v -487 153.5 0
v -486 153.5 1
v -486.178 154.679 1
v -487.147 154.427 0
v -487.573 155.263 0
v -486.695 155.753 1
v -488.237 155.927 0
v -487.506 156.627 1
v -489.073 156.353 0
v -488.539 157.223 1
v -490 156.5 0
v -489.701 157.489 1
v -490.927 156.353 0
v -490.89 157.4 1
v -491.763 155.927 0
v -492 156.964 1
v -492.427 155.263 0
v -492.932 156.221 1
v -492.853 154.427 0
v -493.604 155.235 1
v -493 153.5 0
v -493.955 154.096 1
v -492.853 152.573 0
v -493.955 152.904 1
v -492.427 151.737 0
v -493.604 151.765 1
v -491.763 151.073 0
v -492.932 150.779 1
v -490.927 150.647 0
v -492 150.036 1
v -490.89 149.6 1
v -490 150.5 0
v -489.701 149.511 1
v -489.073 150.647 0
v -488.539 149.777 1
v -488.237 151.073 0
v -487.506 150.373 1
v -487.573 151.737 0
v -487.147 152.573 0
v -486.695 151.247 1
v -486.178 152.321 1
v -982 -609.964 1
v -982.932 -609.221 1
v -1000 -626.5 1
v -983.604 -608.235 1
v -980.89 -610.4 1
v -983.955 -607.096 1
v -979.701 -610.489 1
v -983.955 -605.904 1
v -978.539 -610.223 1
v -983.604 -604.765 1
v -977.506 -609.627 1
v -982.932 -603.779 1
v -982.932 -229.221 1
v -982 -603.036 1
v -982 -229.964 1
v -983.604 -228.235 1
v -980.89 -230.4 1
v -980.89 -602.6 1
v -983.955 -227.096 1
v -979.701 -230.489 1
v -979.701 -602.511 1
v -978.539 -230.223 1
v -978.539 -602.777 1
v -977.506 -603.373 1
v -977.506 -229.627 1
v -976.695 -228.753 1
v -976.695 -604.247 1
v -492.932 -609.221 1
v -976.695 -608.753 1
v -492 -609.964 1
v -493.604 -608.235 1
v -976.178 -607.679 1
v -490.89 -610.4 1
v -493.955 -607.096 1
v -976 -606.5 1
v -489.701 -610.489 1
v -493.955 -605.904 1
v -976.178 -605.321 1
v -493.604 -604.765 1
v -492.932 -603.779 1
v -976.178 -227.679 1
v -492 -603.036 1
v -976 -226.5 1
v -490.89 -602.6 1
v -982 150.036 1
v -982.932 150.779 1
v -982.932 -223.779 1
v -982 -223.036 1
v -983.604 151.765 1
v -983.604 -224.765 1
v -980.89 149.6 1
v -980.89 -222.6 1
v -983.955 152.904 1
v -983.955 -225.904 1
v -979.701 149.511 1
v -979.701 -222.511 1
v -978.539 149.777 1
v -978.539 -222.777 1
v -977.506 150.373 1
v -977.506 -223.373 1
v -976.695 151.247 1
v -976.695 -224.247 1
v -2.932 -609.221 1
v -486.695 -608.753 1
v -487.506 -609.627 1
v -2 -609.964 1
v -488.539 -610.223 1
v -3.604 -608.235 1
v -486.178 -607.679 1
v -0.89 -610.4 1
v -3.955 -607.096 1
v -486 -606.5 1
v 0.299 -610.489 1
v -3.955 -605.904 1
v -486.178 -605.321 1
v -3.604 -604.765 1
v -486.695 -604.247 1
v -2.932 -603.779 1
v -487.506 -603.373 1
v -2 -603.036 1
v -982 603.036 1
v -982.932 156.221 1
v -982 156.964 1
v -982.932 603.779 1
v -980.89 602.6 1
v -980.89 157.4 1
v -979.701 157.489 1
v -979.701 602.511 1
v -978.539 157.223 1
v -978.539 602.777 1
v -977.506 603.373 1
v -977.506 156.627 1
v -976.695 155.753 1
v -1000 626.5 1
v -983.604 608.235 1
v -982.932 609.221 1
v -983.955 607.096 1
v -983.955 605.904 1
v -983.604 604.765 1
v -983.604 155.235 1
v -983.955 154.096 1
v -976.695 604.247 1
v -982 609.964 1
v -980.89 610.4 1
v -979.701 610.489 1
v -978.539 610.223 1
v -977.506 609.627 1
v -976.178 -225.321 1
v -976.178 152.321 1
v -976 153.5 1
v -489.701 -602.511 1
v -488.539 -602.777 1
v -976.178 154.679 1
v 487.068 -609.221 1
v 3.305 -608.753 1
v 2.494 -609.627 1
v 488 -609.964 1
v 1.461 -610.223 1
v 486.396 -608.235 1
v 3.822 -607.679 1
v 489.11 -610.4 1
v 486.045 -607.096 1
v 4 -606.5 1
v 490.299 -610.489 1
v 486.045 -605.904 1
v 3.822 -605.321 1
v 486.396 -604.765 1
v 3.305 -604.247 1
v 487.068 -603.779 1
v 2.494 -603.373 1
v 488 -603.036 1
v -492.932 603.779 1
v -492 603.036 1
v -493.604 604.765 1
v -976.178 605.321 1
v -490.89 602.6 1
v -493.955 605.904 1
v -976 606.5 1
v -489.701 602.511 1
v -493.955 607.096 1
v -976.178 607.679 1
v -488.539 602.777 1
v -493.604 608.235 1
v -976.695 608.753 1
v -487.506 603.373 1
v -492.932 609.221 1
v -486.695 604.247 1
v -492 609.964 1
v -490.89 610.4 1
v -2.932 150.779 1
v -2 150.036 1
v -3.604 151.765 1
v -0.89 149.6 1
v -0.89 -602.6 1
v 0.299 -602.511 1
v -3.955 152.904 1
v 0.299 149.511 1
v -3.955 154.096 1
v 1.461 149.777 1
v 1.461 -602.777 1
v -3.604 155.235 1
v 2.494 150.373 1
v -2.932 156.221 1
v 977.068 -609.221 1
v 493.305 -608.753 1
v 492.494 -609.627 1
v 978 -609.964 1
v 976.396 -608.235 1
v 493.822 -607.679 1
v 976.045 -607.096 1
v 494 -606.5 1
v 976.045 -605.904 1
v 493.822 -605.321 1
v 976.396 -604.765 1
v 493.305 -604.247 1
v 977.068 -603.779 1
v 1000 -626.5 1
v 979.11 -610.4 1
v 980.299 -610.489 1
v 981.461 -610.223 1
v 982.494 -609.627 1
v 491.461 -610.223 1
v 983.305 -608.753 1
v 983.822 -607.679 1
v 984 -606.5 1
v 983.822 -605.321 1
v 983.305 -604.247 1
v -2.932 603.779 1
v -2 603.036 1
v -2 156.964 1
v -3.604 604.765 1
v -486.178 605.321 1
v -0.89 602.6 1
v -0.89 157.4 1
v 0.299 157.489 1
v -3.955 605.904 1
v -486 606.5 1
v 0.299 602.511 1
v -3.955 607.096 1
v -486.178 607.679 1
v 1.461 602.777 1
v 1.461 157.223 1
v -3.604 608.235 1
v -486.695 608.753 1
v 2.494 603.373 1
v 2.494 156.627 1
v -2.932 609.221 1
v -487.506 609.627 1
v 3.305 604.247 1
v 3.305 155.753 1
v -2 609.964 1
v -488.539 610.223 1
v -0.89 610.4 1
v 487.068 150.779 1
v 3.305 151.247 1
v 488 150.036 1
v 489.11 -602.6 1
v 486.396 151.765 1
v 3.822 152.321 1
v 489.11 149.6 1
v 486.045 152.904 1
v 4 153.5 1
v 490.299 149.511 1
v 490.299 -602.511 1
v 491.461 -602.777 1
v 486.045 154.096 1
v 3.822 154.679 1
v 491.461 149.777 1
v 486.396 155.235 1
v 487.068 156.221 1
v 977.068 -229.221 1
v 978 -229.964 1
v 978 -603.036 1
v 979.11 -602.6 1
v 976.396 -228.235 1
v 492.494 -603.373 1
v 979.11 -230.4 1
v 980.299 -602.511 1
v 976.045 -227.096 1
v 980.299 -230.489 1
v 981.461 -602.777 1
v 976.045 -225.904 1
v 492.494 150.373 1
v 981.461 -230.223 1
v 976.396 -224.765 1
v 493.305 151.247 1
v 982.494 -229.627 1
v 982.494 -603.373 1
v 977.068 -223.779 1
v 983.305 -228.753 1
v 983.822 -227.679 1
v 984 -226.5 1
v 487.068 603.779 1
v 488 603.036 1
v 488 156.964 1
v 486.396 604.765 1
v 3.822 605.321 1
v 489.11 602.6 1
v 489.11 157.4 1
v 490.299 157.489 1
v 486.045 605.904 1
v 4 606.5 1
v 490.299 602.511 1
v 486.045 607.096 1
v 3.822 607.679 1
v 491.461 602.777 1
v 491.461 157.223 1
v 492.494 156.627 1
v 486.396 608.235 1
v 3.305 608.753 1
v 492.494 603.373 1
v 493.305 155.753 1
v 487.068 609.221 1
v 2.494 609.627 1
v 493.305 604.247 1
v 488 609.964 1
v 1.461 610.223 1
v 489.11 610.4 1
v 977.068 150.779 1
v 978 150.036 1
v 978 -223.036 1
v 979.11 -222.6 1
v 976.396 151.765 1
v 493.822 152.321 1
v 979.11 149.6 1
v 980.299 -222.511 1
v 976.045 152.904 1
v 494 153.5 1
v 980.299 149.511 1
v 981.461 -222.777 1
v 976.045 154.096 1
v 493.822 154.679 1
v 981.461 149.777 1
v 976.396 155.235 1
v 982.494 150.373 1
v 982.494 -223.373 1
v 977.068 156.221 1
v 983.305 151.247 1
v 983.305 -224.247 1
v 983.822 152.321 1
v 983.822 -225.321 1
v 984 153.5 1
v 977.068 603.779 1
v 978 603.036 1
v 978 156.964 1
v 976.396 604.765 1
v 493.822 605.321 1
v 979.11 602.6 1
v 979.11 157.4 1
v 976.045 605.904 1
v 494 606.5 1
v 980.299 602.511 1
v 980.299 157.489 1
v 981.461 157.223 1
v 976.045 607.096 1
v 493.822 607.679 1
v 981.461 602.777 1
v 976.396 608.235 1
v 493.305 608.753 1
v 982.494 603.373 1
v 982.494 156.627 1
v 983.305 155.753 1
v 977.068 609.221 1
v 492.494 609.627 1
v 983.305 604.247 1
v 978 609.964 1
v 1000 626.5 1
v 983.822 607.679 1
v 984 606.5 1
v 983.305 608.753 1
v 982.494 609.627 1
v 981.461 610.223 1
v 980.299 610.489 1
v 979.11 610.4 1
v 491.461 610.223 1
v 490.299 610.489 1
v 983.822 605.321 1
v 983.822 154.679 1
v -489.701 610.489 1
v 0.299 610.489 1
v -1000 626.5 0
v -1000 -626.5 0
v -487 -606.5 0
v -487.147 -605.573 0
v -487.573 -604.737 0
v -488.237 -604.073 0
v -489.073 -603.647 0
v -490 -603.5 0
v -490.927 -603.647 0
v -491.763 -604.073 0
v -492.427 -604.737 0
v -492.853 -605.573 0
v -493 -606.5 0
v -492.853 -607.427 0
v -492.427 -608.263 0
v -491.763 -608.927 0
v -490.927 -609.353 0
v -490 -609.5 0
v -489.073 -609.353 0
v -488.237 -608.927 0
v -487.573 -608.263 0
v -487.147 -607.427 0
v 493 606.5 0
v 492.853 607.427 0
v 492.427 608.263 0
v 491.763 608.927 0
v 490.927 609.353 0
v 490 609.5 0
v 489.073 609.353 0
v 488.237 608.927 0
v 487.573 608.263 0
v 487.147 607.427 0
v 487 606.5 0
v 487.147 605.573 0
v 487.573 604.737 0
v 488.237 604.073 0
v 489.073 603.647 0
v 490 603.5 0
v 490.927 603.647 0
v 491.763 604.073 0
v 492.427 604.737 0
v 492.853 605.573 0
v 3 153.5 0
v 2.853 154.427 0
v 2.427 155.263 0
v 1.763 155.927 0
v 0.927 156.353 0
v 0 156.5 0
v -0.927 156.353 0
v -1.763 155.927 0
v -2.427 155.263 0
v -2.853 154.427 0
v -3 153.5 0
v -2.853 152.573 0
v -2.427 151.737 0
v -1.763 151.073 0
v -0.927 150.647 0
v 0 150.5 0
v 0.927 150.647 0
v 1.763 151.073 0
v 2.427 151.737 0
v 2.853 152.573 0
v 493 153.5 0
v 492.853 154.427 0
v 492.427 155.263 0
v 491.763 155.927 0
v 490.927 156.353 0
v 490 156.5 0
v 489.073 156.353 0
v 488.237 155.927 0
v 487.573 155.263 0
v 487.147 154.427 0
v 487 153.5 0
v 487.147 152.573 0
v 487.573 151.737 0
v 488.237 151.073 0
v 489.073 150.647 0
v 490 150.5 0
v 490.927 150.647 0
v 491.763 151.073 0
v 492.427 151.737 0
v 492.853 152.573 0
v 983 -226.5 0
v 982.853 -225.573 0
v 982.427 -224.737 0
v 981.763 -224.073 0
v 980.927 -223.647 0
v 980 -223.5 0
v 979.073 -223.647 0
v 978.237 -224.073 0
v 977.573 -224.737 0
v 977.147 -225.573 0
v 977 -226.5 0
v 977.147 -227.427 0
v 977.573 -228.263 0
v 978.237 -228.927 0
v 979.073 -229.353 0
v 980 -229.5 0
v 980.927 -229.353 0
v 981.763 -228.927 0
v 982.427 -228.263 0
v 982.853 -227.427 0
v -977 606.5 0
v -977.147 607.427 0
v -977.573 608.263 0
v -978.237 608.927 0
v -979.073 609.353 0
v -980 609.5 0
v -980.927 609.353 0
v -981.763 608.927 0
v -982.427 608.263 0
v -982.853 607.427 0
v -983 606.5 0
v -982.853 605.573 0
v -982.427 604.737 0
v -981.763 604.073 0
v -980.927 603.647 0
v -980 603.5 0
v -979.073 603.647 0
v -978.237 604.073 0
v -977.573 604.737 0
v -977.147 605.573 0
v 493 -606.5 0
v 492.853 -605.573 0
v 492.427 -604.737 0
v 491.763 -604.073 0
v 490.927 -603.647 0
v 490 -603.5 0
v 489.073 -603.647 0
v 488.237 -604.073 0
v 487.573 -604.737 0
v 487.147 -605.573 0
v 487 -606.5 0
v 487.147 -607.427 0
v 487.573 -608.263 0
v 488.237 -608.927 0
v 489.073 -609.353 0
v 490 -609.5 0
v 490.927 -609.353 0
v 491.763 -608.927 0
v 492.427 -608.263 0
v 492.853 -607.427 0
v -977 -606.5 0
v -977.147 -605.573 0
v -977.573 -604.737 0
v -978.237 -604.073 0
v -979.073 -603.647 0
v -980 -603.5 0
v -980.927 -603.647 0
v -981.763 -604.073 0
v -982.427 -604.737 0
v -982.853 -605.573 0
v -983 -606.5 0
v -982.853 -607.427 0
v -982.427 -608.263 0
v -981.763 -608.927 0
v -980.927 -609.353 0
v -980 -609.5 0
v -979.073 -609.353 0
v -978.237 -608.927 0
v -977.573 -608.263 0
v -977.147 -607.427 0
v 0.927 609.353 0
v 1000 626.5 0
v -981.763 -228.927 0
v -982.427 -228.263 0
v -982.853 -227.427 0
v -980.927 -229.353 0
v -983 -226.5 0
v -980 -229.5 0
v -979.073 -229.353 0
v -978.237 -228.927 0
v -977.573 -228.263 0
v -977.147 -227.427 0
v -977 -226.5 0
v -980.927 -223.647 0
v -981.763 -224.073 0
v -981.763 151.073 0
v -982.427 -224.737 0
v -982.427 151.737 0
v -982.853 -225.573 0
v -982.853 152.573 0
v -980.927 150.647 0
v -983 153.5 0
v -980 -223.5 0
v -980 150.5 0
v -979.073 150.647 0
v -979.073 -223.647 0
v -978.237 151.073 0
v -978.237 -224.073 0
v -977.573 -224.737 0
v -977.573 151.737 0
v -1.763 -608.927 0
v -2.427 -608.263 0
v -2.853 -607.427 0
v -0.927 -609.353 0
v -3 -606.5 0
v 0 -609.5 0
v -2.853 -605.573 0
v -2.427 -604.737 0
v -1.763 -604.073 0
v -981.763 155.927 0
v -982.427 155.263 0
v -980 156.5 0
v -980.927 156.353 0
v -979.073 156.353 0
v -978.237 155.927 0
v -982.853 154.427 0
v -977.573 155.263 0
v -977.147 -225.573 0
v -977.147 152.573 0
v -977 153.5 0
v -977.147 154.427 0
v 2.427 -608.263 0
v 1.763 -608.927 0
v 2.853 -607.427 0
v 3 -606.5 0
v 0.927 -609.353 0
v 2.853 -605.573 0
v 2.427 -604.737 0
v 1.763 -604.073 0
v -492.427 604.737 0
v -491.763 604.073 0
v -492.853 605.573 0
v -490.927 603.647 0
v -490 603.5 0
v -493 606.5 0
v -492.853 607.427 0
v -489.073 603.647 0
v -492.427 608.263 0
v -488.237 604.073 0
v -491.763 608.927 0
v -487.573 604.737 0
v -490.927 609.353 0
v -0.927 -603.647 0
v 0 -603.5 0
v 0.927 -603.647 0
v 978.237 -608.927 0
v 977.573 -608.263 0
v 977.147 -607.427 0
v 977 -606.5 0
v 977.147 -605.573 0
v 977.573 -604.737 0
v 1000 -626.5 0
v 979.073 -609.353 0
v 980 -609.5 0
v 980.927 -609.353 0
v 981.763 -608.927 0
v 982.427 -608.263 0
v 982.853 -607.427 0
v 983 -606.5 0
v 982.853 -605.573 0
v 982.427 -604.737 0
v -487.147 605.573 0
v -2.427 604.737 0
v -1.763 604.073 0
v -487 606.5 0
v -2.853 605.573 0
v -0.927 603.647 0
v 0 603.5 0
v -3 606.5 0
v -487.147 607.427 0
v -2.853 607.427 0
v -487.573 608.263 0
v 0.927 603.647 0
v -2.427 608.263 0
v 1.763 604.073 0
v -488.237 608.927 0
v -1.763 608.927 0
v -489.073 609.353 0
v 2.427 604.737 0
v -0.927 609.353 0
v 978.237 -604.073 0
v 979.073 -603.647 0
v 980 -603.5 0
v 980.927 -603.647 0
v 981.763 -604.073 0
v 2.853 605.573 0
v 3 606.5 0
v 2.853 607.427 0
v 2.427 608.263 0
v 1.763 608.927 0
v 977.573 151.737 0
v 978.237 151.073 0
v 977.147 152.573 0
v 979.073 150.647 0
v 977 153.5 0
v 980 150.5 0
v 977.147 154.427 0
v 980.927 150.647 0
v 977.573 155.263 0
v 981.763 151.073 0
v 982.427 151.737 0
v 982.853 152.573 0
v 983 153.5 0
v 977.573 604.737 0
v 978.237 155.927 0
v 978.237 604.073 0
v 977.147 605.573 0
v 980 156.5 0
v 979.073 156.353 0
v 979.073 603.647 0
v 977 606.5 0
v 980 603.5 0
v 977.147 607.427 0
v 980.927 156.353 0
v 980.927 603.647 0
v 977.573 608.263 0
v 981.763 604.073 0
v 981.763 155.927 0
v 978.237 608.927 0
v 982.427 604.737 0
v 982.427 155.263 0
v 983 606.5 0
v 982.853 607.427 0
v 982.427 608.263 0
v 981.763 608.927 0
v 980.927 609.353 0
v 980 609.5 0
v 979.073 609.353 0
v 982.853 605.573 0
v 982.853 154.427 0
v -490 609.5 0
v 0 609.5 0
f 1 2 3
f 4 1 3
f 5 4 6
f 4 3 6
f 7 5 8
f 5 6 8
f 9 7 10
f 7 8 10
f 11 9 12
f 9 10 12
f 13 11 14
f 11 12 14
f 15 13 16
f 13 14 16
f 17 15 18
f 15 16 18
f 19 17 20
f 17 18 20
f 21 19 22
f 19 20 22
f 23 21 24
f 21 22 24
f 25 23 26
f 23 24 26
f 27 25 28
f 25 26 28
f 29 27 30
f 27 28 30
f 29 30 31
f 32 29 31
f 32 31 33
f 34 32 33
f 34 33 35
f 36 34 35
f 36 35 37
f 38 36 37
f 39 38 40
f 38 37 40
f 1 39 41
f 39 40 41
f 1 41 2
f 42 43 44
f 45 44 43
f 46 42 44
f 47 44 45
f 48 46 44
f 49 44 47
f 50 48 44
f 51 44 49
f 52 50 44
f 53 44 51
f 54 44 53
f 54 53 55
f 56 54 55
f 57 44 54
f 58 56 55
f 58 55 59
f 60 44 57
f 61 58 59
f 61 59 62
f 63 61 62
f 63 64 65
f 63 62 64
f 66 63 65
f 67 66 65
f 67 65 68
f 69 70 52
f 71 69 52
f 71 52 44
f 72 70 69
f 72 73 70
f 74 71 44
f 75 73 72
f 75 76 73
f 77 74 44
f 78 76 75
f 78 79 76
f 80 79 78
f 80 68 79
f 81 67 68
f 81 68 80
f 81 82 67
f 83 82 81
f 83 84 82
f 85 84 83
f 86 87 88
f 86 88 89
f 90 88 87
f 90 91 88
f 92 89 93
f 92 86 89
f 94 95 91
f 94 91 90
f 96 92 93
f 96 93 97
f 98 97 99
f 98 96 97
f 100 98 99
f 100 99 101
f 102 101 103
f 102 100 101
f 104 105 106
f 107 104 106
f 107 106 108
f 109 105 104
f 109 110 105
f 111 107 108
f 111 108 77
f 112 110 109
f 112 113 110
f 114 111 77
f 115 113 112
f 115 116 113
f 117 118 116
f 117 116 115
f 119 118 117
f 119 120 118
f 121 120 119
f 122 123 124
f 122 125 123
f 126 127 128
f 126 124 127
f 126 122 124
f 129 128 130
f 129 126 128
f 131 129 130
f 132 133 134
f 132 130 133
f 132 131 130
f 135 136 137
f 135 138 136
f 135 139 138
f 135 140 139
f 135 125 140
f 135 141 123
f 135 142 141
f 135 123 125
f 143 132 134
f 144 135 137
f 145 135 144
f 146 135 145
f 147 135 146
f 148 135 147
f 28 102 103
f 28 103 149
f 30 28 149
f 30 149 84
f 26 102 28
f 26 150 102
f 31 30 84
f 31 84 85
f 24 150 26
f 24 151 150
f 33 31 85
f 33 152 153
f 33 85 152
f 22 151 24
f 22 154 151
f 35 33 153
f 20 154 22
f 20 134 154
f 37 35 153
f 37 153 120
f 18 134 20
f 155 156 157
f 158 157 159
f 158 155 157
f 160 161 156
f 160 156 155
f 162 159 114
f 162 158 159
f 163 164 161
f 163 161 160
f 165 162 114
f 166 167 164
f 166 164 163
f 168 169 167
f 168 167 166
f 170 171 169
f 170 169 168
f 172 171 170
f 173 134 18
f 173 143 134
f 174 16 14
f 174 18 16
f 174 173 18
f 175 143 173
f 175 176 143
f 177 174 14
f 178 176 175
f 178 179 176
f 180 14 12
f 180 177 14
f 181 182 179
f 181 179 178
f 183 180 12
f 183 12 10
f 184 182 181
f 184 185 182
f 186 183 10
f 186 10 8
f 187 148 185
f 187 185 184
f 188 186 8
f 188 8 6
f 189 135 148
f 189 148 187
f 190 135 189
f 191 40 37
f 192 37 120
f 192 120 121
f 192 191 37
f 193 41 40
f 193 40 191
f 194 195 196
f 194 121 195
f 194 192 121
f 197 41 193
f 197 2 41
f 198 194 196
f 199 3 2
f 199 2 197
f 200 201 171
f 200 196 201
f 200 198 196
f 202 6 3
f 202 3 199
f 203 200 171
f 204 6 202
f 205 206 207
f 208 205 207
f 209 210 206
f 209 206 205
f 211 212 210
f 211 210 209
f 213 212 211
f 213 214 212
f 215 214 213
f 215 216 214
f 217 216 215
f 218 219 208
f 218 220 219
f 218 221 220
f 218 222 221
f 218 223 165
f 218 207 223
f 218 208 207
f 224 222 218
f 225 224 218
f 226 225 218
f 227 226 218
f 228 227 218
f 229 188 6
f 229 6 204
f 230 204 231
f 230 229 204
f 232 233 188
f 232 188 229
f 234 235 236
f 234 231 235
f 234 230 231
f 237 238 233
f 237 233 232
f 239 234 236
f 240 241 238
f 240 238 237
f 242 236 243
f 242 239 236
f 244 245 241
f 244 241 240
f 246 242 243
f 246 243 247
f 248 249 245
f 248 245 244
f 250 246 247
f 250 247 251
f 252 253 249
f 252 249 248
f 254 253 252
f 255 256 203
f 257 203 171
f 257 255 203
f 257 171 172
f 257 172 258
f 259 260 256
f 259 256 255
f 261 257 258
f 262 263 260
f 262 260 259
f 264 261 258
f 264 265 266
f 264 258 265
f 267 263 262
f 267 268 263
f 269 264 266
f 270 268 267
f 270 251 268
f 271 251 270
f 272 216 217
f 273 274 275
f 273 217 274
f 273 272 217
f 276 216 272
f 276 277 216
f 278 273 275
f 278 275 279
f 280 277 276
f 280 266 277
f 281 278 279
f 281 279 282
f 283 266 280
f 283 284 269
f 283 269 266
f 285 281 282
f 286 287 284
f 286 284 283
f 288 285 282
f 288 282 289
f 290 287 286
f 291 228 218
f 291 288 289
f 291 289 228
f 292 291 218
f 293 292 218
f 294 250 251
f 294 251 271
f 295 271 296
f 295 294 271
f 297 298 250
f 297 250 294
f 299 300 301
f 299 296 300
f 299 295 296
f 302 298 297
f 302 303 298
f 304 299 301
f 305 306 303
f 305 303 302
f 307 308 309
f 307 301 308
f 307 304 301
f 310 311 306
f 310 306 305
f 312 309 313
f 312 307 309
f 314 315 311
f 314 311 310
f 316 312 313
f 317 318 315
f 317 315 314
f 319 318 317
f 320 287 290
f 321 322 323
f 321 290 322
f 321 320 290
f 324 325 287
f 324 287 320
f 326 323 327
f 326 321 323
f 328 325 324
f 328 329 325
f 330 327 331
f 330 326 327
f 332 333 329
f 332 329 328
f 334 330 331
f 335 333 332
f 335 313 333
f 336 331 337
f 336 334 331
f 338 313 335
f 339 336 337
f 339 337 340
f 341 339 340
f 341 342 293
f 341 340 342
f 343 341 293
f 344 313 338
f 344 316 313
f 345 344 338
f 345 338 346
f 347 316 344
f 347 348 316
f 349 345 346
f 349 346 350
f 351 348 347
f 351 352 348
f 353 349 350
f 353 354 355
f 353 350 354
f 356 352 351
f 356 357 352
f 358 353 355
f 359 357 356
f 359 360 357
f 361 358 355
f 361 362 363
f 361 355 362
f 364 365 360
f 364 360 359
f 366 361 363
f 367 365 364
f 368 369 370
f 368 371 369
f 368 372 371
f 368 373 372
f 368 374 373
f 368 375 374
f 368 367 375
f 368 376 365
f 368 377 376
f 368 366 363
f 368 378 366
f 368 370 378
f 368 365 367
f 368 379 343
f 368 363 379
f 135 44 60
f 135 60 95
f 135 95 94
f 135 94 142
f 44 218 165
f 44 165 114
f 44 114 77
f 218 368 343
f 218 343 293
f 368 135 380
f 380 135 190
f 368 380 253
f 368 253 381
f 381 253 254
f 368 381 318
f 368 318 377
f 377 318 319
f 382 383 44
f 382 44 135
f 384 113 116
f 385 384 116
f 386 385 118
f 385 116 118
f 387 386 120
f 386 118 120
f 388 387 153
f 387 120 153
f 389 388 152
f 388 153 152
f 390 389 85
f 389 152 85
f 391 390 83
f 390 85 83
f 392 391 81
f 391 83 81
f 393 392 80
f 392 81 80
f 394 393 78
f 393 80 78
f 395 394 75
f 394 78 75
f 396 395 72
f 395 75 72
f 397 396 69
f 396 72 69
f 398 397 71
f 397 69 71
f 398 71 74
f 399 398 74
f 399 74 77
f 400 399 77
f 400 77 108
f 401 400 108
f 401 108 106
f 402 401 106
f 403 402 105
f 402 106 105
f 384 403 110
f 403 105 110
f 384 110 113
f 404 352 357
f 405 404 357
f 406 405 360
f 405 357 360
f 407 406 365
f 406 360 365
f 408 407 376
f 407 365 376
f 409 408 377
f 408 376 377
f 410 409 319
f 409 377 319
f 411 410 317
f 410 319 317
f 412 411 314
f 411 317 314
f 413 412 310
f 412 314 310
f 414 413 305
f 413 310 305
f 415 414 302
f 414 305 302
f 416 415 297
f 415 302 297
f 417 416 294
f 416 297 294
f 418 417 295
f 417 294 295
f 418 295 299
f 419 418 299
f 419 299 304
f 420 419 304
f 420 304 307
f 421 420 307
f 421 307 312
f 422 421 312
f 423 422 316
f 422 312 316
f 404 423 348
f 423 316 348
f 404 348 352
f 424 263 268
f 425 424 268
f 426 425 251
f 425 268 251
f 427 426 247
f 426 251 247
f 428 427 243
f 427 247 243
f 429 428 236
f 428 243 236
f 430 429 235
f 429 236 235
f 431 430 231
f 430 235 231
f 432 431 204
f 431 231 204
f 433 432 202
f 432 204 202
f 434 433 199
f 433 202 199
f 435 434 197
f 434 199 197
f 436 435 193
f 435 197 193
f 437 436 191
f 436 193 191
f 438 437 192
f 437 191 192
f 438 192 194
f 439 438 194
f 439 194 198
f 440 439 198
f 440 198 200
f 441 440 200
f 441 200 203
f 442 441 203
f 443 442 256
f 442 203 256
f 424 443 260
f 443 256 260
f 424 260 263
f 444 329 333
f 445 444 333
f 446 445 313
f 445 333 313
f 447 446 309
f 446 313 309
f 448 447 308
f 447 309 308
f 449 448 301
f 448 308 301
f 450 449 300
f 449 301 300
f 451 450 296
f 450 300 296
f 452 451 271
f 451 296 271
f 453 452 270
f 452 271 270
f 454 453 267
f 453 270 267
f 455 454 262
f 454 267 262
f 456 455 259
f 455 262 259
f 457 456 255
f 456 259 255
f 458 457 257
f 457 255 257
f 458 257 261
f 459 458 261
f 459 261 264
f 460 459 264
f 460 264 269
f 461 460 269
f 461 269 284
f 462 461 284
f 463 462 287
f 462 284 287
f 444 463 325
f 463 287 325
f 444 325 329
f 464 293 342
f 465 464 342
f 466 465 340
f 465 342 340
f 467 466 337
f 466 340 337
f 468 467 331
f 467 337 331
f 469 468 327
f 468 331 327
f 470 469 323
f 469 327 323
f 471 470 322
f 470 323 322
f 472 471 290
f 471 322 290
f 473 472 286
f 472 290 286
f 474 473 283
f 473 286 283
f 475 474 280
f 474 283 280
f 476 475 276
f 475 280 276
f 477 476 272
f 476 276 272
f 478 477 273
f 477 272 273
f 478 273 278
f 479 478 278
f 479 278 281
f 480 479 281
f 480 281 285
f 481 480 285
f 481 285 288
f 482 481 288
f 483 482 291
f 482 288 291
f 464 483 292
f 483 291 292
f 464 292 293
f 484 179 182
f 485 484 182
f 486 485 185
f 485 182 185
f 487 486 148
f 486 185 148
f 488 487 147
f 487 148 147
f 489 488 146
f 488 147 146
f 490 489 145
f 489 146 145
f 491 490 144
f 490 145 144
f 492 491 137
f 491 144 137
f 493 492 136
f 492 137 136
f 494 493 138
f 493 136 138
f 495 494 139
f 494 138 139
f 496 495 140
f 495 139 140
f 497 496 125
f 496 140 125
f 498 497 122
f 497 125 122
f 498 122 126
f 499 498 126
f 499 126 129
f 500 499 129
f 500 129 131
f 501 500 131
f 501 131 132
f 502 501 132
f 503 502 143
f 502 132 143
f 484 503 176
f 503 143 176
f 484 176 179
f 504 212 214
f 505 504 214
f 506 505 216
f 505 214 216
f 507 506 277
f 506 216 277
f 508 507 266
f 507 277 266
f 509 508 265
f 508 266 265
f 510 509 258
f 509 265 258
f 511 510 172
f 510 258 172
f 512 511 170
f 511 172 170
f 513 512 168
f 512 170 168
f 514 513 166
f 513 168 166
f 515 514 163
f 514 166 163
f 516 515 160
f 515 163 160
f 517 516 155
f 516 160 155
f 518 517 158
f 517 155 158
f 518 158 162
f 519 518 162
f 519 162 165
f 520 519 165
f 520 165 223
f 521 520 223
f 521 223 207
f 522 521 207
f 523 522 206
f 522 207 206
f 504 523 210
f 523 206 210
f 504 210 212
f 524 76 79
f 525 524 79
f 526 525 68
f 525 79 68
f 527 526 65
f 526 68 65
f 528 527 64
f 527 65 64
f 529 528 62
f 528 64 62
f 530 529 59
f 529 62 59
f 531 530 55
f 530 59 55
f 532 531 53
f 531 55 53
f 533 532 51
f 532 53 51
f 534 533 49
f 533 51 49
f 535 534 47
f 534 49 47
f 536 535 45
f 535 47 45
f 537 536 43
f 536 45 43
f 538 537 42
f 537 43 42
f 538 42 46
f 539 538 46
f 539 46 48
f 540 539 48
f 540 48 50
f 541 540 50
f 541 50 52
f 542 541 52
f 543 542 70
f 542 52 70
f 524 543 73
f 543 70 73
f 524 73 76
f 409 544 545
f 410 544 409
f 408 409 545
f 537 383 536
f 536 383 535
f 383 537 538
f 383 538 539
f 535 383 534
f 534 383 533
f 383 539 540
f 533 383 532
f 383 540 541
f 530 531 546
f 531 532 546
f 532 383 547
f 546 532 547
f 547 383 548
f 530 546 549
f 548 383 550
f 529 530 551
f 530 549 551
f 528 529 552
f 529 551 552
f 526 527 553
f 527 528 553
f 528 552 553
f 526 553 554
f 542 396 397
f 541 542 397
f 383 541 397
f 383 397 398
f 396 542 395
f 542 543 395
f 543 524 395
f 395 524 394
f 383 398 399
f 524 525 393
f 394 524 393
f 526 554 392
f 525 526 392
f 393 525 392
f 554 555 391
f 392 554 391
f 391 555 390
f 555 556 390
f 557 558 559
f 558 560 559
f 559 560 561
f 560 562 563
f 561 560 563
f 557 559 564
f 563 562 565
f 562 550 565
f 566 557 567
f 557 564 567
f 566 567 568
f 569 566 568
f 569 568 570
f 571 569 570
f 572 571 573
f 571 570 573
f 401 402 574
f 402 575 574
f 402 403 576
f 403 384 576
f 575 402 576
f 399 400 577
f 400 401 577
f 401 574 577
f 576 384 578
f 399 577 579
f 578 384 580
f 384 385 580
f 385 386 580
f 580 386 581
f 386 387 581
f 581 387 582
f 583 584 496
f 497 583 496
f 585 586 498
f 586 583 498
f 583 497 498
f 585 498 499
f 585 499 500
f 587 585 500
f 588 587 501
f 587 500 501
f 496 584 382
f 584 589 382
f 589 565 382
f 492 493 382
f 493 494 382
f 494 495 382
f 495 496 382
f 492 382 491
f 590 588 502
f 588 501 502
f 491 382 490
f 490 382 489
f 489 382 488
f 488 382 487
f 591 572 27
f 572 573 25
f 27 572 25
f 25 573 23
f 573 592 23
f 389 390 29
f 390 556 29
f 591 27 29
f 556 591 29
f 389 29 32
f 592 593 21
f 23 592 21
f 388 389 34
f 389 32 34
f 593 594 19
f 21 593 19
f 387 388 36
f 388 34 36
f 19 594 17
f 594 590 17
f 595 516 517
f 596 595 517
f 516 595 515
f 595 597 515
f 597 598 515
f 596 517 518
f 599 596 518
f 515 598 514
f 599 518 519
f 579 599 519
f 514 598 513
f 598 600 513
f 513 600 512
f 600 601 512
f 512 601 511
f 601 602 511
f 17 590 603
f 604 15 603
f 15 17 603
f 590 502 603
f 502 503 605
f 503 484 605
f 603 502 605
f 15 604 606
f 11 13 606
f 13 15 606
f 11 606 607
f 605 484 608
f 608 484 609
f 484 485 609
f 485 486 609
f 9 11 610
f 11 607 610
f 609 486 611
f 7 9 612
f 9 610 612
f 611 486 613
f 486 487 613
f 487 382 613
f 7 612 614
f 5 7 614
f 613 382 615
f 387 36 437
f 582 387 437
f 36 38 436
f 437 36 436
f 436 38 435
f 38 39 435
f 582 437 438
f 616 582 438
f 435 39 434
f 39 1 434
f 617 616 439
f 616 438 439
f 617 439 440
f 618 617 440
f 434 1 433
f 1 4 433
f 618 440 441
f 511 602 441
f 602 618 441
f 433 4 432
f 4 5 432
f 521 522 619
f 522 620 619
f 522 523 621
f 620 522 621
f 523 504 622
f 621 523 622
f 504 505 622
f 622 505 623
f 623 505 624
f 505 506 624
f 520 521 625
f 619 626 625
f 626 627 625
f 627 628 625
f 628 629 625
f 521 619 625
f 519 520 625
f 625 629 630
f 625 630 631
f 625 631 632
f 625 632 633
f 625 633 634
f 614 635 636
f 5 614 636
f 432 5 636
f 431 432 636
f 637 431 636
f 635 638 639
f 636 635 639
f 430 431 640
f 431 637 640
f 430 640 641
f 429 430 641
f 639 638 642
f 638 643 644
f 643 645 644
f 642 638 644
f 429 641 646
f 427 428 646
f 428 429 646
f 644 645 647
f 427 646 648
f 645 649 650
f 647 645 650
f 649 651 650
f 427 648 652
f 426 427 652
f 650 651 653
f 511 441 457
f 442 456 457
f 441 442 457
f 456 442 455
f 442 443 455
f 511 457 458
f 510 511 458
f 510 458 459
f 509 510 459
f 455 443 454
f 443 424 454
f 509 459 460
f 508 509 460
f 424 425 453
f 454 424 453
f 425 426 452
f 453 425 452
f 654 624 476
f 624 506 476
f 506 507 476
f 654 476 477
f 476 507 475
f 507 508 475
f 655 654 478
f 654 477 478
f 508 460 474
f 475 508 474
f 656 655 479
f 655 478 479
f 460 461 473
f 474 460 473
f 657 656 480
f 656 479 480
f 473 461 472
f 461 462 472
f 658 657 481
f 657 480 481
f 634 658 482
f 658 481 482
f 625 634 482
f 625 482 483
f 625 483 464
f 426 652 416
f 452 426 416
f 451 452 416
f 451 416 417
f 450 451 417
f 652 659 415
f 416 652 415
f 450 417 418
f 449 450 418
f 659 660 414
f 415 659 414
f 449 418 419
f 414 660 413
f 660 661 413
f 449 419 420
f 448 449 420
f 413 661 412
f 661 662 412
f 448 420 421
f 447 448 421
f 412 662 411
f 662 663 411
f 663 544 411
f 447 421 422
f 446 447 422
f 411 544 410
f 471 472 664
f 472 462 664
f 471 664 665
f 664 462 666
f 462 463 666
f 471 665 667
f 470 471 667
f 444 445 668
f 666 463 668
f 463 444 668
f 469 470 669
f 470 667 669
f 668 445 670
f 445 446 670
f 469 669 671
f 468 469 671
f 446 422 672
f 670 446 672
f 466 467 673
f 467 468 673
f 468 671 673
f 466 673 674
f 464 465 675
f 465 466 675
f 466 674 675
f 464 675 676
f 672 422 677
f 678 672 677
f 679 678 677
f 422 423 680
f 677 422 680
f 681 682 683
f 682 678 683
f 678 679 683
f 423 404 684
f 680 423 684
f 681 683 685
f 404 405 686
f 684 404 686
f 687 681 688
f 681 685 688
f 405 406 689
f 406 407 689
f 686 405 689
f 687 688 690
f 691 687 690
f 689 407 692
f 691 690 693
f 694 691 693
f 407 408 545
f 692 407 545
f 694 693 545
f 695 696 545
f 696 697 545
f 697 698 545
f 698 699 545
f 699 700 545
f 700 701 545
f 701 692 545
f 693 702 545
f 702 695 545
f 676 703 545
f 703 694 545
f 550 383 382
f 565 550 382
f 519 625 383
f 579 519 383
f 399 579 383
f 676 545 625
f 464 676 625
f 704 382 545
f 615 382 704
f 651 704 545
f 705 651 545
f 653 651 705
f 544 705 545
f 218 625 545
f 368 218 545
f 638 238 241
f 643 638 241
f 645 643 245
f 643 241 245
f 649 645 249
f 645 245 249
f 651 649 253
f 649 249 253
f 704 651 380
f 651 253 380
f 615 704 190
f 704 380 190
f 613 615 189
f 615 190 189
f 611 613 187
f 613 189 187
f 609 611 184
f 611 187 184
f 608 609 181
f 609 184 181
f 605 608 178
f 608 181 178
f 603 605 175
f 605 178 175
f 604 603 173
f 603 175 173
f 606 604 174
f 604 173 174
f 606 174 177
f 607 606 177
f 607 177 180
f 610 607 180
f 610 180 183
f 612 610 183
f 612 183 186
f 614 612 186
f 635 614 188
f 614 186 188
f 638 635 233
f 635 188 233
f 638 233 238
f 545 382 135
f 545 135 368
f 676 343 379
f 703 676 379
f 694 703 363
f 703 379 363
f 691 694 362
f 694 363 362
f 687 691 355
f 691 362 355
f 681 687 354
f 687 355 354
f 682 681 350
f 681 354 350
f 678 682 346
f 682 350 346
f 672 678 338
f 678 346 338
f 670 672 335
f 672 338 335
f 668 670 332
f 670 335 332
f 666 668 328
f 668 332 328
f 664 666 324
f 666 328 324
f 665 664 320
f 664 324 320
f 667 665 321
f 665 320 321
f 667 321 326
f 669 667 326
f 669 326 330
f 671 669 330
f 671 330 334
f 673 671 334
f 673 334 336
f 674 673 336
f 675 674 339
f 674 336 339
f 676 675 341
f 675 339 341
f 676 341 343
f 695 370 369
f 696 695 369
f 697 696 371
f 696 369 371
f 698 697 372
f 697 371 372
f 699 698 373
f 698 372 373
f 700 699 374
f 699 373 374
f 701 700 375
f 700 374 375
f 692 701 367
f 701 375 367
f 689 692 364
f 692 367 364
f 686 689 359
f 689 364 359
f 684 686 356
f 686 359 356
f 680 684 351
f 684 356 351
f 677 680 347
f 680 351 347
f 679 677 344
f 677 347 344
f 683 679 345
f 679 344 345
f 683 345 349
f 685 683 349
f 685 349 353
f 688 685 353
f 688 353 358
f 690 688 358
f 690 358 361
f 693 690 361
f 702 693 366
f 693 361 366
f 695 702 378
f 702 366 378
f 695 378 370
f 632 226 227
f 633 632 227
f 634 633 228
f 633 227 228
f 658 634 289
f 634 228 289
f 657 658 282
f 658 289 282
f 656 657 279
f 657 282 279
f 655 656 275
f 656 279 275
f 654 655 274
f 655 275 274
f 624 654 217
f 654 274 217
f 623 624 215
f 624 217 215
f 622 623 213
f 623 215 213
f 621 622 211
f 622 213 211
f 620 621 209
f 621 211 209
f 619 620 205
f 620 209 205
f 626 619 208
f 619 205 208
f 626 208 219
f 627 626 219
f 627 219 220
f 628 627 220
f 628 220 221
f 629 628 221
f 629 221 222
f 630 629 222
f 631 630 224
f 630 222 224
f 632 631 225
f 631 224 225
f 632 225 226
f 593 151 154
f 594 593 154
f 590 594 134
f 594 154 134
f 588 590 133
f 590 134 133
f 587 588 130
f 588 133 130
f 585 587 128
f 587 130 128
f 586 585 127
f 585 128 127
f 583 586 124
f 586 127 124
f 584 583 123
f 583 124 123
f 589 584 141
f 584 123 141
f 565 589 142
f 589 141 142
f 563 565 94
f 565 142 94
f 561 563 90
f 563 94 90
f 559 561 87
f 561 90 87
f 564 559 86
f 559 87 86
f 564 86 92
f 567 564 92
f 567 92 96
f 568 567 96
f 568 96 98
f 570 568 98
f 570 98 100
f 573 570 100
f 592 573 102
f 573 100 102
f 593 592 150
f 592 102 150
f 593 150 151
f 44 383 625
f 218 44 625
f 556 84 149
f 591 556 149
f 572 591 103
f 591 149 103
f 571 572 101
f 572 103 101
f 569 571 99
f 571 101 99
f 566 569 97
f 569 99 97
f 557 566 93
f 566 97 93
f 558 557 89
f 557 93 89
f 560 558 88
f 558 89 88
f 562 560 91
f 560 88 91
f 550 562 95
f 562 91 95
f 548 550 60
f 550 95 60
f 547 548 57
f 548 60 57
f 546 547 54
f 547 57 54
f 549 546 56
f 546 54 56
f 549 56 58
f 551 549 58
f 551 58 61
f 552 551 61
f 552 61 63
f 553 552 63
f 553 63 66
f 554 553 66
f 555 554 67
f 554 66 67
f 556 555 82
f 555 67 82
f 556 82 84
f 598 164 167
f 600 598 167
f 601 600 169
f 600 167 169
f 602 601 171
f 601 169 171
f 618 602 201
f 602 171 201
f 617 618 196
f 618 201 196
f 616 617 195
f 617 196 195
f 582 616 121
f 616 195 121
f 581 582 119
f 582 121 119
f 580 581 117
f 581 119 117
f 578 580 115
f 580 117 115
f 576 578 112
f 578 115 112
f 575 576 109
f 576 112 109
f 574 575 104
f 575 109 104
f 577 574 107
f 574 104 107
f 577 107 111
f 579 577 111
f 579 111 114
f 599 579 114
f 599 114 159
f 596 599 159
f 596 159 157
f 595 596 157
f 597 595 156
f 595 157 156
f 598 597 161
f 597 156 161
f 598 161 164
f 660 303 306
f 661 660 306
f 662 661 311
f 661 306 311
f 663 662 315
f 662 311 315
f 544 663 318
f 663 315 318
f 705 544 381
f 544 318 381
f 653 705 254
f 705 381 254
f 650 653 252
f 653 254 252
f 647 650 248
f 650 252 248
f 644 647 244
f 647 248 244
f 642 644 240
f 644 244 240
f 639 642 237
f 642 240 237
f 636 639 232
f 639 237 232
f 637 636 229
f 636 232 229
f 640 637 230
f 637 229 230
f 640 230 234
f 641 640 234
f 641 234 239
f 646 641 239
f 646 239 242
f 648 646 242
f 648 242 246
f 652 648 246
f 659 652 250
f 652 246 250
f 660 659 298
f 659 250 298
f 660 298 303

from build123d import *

# Parameters (mm, degrees)
SKETCH1_W           = 2000
SKETCH1_H           = 1253
SKETCH1_R           = 3
BOSS_EXTRUDE1_DEPTH = 1
CHAMFER1_SIZE       = 1


with BuildPart() as part:
    # Sketch1 → Boss-Extrude1 (new body)
    with BuildSketch(Plane.XY):
        Rectangle(SKETCH1_W, SKETCH1_H)
        with Locations((-980, 606.5)):
            Circle(SKETCH1_R, mode=Mode.SUBTRACT)
        with Locations((980, 606.5)):
            Circle(SKETCH1_R, mode=Mode.SUBTRACT)
        with Locations((0, 606.5)):
            Circle(SKETCH1_R, mode=Mode.SUBTRACT)
        with Locations((-980, -606.5)):
            Circle(SKETCH1_R, mode=Mode.SUBTRACT)
        with Locations((980, -606.5)):
            Circle(SKETCH1_R, mode=Mode.SUBTRACT)
        with Locations((0, -606.5)):
            Circle(SKETCH1_R, mode=Mode.SUBTRACT)
        with Locations((-490, -606.5)):
            Circle(SKETCH1_R, mode=Mode.SUBTRACT)
        with Locations((490, -606.5)):
            Circle(SKETCH1_R, mode=Mode.SUBTRACT)
        with Locations((-490, 606.5)):
            Circle(SKETCH1_R, mode=Mode.SUBTRACT)
        with Locations((490, 606.5)):
            Circle(SKETCH1_R, mode=Mode.SUBTRACT)
        with Locations((980, 153.5)):
            Circle(SKETCH1_R, mode=Mode.SUBTRACT)
        with Locations((490, 153.5)):
            Circle(SKETCH1_R, mode=Mode.SUBTRACT)
        with Locations((0, 153.5)):
            Circle(SKETCH1_R, mode=Mode.SUBTRACT)
        with Locations((-490, 153.5)):
            Circle(SKETCH1_R, mode=Mode.SUBTRACT)
        with Locations((-980, 153.5)):
            Circle(SKETCH1_R, mode=Mode.SUBTRACT)
        with Locations((980, -226.5)):
            Circle(SKETCH1_R, mode=Mode.SUBTRACT)
        with Locations((-980, -226.5)):
            Circle(SKETCH1_R, mode=Mode.SUBTRACT)
    extrude(amount=BOSS_EXTRUDE1_DEPTH)

    # Chamfer1
    chamfer1_edges = [part.edges().sort_by_distance(p)[0] for p in [
        (-983, 606.5, 1),
        (977, 606.5, 1),
        (-3, 606.5, 1),
        (-983, -606.5, 1),
        (977, -606.5, 1),
        (-3, -606.5, 1),
        (977, -226.5, 1),
        (-983, -226.5, 1),
        (-493, -606.5, 1),
        (487, -606.5, 1),
        (-493, 606.5, 1),
        (487, 606.5, 1),
        (-983, 153.5, 1),
        (977, 153.5, 1),
        (-3, 153.5, 1),
        (-493, 153.5, 1),
        (487, 153.5, 1),
    ]]
    chamfer(chamfer1_edges, length=CHAMFER1_SIZE - 0.0001)  # a hair under: the kernel refuses the full size


solid = part.part
